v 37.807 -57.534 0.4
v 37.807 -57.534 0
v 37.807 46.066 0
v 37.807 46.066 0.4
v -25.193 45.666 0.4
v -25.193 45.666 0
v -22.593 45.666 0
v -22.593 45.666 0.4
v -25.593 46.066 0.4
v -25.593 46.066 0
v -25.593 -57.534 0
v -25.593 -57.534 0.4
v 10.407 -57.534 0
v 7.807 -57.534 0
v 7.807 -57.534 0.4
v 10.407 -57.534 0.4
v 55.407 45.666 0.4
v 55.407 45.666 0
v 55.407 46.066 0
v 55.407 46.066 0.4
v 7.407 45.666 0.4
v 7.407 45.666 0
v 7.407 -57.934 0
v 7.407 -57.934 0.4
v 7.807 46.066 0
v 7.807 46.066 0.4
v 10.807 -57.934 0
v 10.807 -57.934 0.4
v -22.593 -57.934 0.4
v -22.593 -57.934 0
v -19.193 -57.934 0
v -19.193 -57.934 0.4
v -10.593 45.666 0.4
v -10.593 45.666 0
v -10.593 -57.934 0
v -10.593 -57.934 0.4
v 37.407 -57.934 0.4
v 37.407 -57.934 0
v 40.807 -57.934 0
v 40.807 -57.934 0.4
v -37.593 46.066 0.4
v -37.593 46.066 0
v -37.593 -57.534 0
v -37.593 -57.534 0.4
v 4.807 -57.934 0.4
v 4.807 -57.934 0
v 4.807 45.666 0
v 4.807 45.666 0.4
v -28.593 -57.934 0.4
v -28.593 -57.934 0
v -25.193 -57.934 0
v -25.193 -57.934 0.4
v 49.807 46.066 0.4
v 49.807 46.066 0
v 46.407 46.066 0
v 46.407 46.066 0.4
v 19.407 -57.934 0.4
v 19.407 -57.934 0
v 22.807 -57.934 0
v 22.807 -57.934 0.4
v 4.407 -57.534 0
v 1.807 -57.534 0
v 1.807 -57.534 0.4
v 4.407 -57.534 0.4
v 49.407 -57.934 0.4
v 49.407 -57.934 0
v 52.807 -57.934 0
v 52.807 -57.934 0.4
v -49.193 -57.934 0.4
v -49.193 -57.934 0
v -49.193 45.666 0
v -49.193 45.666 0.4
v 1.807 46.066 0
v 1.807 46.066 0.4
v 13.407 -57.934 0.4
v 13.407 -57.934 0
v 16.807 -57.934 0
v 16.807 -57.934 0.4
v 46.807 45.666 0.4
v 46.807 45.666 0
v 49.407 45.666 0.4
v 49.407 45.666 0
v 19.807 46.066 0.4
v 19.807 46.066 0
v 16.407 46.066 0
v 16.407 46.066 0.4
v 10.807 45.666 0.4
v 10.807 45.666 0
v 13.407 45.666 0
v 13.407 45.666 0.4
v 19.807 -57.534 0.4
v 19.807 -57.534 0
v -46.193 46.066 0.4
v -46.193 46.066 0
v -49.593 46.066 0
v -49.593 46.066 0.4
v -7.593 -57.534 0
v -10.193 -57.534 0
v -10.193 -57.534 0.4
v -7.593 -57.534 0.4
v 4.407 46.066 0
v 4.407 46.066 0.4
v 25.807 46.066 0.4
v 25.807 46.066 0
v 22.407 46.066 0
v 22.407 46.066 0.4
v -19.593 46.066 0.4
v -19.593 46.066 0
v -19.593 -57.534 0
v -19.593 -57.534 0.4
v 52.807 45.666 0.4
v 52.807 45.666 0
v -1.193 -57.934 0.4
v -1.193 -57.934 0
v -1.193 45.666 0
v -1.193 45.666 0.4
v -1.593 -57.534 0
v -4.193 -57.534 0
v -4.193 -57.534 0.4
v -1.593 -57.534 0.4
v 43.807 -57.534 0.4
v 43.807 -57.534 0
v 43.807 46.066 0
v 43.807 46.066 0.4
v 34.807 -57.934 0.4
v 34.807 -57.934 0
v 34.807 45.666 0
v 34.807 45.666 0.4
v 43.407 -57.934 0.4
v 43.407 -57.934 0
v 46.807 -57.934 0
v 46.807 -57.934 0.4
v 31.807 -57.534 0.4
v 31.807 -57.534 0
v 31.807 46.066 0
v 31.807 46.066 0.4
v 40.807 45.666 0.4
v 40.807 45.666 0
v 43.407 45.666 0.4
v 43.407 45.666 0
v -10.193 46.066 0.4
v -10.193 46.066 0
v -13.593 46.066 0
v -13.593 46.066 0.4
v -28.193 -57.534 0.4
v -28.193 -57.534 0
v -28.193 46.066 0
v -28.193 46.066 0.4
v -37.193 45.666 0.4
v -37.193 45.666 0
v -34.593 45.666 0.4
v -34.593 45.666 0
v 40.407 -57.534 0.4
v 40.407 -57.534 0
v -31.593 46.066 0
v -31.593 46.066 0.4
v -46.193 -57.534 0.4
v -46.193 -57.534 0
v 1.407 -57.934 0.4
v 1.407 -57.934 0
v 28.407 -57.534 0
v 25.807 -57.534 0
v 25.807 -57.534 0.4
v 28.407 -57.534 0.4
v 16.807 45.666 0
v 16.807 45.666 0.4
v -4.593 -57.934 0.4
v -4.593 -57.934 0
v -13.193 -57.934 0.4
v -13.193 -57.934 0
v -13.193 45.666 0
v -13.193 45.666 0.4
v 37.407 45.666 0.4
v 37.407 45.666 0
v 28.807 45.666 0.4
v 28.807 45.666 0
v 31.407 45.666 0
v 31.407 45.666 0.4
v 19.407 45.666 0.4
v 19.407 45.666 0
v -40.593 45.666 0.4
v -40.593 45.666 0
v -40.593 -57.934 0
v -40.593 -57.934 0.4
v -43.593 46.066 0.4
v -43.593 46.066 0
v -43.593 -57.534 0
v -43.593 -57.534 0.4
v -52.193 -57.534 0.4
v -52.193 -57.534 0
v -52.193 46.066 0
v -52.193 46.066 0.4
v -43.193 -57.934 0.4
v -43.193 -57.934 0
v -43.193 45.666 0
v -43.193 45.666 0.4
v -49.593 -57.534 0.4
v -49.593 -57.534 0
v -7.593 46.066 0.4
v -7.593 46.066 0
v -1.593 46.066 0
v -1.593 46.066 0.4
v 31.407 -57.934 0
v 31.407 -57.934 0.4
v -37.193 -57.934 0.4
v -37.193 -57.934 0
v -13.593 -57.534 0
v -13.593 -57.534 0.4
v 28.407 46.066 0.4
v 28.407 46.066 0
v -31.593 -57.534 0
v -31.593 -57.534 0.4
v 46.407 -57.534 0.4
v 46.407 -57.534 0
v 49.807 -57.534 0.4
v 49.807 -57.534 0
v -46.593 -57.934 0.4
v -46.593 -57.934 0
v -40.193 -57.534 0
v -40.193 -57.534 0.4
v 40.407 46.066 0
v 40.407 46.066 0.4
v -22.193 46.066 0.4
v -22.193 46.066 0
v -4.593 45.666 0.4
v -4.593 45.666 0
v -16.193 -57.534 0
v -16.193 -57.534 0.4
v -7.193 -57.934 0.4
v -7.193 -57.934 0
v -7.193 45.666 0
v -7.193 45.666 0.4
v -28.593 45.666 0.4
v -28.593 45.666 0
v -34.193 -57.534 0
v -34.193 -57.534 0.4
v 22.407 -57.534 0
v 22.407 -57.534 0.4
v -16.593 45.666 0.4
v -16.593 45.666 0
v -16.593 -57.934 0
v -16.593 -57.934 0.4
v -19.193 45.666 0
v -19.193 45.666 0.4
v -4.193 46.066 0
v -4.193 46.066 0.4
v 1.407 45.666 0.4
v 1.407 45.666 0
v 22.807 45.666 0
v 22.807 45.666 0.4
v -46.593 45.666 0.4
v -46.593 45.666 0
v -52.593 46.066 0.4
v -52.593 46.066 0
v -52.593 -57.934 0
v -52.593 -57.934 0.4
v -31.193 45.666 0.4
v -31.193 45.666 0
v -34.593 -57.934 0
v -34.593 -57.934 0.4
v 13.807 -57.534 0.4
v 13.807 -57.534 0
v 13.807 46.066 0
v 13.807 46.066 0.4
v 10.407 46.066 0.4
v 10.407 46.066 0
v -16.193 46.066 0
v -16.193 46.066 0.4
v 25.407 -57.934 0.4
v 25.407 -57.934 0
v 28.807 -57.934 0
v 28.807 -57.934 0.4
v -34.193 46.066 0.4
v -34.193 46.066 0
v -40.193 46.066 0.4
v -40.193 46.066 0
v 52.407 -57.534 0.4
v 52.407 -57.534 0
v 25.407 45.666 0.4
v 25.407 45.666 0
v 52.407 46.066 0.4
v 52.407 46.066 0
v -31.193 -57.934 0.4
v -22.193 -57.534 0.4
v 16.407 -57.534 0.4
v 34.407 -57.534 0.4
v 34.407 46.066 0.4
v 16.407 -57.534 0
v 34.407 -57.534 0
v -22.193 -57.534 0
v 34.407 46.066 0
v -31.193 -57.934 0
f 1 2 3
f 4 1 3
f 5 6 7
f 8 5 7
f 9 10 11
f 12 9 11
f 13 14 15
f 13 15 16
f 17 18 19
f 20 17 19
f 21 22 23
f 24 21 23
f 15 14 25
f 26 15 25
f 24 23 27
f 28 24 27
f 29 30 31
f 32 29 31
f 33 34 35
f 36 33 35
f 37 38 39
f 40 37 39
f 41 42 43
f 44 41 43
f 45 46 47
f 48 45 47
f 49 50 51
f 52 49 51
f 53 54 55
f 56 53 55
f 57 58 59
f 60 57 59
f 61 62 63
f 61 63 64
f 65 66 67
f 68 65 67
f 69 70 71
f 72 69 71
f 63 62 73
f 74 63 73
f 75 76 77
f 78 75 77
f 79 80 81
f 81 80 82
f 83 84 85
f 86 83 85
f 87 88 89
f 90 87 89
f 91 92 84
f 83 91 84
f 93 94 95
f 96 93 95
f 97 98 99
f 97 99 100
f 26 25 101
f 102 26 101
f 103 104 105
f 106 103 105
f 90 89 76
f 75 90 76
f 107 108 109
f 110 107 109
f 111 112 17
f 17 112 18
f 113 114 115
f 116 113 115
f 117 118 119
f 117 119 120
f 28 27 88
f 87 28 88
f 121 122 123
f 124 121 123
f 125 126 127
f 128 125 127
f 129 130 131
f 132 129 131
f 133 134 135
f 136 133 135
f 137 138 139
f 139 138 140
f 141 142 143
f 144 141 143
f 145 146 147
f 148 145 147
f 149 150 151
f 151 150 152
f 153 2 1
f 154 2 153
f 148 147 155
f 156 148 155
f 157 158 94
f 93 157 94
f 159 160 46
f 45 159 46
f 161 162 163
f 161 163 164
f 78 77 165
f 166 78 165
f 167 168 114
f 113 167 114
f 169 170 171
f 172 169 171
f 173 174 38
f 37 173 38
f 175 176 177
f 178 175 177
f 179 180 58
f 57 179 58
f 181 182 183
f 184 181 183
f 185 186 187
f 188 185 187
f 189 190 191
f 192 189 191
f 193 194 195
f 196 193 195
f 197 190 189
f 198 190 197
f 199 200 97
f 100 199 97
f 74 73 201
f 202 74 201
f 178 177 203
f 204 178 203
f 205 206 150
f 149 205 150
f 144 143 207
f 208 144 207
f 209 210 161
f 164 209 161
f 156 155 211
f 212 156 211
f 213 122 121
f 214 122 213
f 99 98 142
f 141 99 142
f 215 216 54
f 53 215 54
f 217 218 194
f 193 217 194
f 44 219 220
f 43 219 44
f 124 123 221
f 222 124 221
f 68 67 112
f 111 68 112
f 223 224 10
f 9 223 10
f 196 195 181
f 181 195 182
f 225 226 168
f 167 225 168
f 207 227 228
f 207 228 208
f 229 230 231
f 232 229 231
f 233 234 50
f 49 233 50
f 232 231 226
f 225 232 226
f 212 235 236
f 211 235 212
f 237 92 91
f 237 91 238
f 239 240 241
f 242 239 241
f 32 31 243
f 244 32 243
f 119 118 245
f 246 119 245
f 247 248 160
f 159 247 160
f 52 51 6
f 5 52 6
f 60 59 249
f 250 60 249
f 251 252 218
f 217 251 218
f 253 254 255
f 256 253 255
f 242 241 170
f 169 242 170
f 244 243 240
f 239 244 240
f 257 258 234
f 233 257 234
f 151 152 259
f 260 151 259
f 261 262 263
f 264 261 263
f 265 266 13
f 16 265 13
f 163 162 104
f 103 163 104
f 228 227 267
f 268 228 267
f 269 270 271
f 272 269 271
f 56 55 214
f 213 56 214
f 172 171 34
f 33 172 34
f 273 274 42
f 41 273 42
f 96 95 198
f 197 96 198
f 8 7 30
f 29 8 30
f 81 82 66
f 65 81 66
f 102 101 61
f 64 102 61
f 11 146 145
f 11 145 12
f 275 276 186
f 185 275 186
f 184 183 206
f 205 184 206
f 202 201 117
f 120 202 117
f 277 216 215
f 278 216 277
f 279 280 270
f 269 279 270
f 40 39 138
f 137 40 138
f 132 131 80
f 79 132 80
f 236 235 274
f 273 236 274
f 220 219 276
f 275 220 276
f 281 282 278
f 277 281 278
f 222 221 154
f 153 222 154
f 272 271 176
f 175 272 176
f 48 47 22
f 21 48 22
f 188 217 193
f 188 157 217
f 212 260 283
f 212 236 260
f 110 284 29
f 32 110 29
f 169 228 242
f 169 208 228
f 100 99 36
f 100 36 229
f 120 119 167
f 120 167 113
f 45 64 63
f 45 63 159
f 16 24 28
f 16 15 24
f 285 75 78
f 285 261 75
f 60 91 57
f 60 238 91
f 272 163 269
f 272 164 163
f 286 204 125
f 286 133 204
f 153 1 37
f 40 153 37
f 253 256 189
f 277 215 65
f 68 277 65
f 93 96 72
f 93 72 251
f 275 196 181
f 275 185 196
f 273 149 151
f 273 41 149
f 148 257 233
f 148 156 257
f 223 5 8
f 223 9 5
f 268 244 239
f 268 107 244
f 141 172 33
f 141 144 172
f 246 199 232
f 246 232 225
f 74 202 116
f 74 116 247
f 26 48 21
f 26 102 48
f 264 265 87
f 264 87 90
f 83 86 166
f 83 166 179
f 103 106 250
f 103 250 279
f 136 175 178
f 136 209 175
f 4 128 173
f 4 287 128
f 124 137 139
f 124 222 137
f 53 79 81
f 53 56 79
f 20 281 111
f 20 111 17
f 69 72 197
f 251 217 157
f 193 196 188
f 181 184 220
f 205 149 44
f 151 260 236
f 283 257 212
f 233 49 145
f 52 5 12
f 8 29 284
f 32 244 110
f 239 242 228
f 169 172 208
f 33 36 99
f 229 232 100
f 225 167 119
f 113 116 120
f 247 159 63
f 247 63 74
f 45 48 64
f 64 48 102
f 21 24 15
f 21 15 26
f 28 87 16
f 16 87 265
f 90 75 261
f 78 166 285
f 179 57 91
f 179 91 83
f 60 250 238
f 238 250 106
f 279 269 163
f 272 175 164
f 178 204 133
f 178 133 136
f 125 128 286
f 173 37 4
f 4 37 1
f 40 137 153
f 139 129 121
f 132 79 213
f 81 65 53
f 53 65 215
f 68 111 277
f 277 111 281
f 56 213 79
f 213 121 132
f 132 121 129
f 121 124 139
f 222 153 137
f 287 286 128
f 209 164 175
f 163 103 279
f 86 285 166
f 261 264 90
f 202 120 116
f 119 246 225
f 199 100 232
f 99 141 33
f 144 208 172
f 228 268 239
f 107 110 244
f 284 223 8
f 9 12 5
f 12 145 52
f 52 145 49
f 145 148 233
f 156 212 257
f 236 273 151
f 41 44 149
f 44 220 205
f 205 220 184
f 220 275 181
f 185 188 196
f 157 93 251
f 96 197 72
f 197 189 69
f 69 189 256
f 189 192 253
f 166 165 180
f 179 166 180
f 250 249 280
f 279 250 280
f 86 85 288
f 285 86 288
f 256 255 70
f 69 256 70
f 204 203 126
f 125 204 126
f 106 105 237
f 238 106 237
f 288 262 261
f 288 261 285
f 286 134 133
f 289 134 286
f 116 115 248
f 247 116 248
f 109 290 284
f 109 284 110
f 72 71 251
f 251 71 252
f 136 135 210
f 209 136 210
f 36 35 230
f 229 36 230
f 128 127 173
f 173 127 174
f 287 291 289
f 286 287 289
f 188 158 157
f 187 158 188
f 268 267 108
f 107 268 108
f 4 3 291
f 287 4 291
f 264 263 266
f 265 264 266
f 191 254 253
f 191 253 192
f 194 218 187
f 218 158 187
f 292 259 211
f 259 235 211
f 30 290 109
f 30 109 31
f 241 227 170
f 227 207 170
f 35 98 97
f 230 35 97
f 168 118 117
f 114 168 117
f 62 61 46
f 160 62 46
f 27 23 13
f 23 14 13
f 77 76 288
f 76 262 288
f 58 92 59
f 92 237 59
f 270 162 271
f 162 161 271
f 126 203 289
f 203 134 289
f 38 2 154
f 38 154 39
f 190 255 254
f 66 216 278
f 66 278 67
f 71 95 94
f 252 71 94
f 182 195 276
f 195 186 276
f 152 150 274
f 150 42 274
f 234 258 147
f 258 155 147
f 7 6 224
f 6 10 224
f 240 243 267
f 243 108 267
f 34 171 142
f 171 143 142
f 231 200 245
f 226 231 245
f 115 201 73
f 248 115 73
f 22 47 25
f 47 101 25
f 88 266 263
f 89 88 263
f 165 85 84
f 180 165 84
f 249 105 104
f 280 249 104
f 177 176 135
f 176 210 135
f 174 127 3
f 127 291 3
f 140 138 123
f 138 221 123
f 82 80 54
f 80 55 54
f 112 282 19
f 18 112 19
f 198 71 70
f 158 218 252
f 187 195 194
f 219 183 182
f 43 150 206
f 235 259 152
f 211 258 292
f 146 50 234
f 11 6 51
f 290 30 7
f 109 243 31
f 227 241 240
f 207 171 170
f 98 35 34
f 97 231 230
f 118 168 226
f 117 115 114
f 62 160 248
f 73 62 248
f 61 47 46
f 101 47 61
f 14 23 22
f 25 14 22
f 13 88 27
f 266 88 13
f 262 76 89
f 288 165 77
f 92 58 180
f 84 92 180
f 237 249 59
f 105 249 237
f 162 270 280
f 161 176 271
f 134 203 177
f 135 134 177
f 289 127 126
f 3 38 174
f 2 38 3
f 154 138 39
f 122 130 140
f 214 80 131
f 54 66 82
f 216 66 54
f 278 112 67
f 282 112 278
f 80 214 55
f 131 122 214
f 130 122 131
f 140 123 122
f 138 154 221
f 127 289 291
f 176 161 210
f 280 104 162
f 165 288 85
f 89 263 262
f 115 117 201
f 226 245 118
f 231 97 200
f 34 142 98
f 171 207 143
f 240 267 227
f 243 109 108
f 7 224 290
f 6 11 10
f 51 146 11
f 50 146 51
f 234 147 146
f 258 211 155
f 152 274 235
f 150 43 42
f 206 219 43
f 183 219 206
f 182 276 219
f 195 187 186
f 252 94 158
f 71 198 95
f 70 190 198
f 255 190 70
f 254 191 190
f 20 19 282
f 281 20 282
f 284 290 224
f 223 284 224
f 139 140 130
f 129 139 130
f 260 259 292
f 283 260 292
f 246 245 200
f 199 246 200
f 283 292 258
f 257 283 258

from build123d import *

# Parameters (mm, degrees)
F0_W     = 0.4
F0_H     = 103.6
F0_W_2   = 2.6
F0_H_2   = 0.4
F1_DEPTH = 0.4


with BuildPart() as f1:
    # F0 (on Top) → F1 (new body)
    with BuildSketch(Plane.XY):
        with Locations((-52.392799, -5.733955)):
            Rectangle(F0_W, F0_H)
        with Locations((54.107201, 45.866045)):
            Rectangle(F0_W_2, F0_H_2)
        with Locations((-52.392799, -57.733955)):
            Rectangle(F0_W, F0_H_2)
        with Locations((-50.892799, -57.733955)):
            Rectangle(F0_W_2, F0_H_2)
        Polygon((-49.592799, 45.666045), (-49.592799, -57.533955), (-49.592799, -57.933955), (-49.192799, -57.933955), (-49.192799, 45.666045), align=None)
        with Locations((-49.392799, 45.866045)):
            Rectangle(F0_W, F0_H_2)
        with Locations((-47.892799, 45.866045)):
            Rectangle(F0_W_2, F0_H_2)
        Polygon((-46.592799, 46.066045), (-46.592799, 45.666045), (-46.592799, -57.533955), (-46.192799, -57.533955), (-46.192799, 46.066045), align=None)
        with Locations((-46.392799, -57.733955)):
            Rectangle(F0_W, F0_H_2)
        with Locations((-44.892799, -57.733955)):
            Rectangle(F0_W_2, F0_H_2)
        Polygon((-43.592799, 45.666045), (-43.592799, -57.533955), (-43.592799, -57.933955), (-43.192799, -57.933955), (-43.192799, 45.666045), align=None)
        with Locations((-43.392799, 45.866045)):
            Rectangle(F0_W, F0_H_2)
        with Locations((-41.892799, 45.866045)):
            Rectangle(F0_W_2, F0_H_2)
        Polygon((-40.592799, 46.066045), (-40.592799, 45.666045), (-40.592799, -57.533955), (-40.192799, -57.533955), (-40.192799, 46.066045), align=None)
        with Locations((-40.392799, -57.733955)):
            Rectangle(F0_W, F0_H_2)
        with Locations((-38.892799, -57.733955)):
            Rectangle(F0_W_2, F0_H_2)
        Polygon((-37.592799, 45.666045), (-37.592799, -57.533955), (-37.592799, -57.933955), (-37.192799, -57.933955), (-37.192799, 45.666045), align=None)
        with Locations((-37.392799, 45.866045)):
            Rectangle(F0_W, F0_H_2)
        with Locations((-35.892799, 45.866045)):
            Rectangle(F0_W_2, F0_H_2)
        Polygon((-34.592799, 46.066045), (-34.592799, 45.666045), (-34.592799, -57.533955), (-34.192799, -57.533955), (-34.192799, 46.066045), align=None)
        with Locations((-34.392799, -57.733955)):
            Rectangle(F0_W, F0_H_2)
        with Locations((-32.892799, -57.733955)):
            Rectangle(F0_W_2, F0_H_2)
        Polygon((-31.592799, 45.666045), (-31.592799, -57.533955), (-31.592799, -57.933955), (-31.192799, -57.933955), (-31.192799, 45.666045), align=None)
        with Locations((-31.392799, 45.866045)):
            Rectangle(F0_W, F0_H_2)
        with Locations((-29.892799, 45.866045)):
            Rectangle(F0_W_2, F0_H_2)
        Polygon((-28.592799, 46.066045), (-28.592799, 45.666045), (-28.592799, -57.533955), (-28.192799, -57.533955), (-28.192799, 46.066045), align=None)
        with Locations((-28.392799, -57.733955)):
            Rectangle(F0_W, F0_H_2)
        with Locations((-26.892799, -57.733955)):
            Rectangle(F0_W_2, F0_H_2)
        Polygon((-25.592799, 45.666045), (-25.592799, -57.533955), (-25.592799, -57.933955), (-25.192799, -57.933955), (-25.192799, 45.666045), align=None)
        with Locations((-25.392799, 45.866045)):
            Rectangle(F0_W, F0_H_2)
        with Locations((-23.892799, 45.866045)):
            Rectangle(F0_W_2, F0_H_2)
        Polygon((-22.592799, 46.066045), (-22.592799, 45.666045), (-22.592799, -57.533955), (-22.192799, -57.533955), (-22.192799, 46.066045), align=None)
        with Locations((-22.392799, -57.733955)):
            Rectangle(F0_W, F0_H_2)
        with Locations((-20.892799, -57.733955)):
            Rectangle(F0_W_2, F0_H_2)
        Polygon((-19.592799, 45.666045), (-19.592799, -57.533955), (-19.592799, -57.933955), (-19.192799, -57.933955), (-19.192799, 45.666045), align=None)
        with Locations((-19.392799, 45.866045)):
            Rectangle(F0_W, F0_H_2)
        with Locations((-17.892799, 45.866045)):
            Rectangle(F0_W_2, F0_H_2)
        Polygon((-16.592799, 46.066045), (-16.592799, 45.666045), (-16.592799, -57.533955), (-16.192799, -57.533955), (-16.192799, 46.066045), align=None)
        with Locations((-16.392799, -57.733955)):
            Rectangle(F0_W, F0_H_2)
        with Locations((-14.892799, -57.733955)):
            Rectangle(F0_W_2, F0_H_2)
        Polygon((-13.592799, 45.666045), (-13.592799, -57.533955), (-13.592799, -57.933955), (-13.192799, -57.933955), (-13.192799, 45.666045), align=None)
        with Locations((-13.392799, 45.866045)):
            Rectangle(F0_W, F0_H_2)
        with Locations((-11.892799, 45.866045)):
            Rectangle(F0_W_2, F0_H_2)
        Polygon((-10.592799, 46.066045), (-10.592799, 45.666045), (-10.592799, -57.533955), (-10.192799, -57.533955), (-10.192799, 46.066045), align=None)
        with Locations((-10.392799, -57.733955)):
            Rectangle(F0_W, F0_H_2)
        with Locations((-8.892799, -57.733955)):
            Rectangle(F0_W_2, F0_H_2)
        Polygon((-7.592799, 45.666045), (-7.592799, -57.533955), (-7.592799, -57.933955), (-7.192799, -57.933955), (-7.192799, 45.666045), align=None)
        with Locations((-7.392799, 45.866045)):
            Rectangle(F0_W, F0_H_2)
        with Locations((-5.892799, 45.866045)):
            Rectangle(F0_W_2, F0_H_2)
        Polygon((-4.592799, 46.066045), (-4.592799, 45.666045), (-4.592799, -57.533955), (-4.192799, -57.533955), (-4.192799, 46.066045), align=None)
        with Locations((-4.392799, -57.733955)):
            Rectangle(F0_W, F0_H_2)
        with Locations((-2.892799, -57.733955)):
            Rectangle(F0_W_2, F0_H_2)
        Polygon((-1.592799, 45.666045), (-1.592799, -57.533955), (-1.592799, -57.933955), (-1.192799, -57.933955), (-1.192799, 45.666045), align=None)
        with Locations((-1.392799, 45.866045)):
            Rectangle(F0_W, F0_H_2)
        with Locations((0.107201, 45.866045)):
            Rectangle(F0_W_2, F0_H_2)
        Polygon((1.407201, 46.066045), (1.407201, 45.666045), (1.407201, -57.533955), (1.807201, -57.533955), (1.807201, 46.066045), align=None)
        with Locations((1.607201, -57.733955)):
            Rectangle(F0_W, F0_H_2)
        with Locations((3.107201, -57.733955)):
            Rectangle(F0_W_2, F0_H_2)
        Polygon((4.407201, 45.666045), (4.407201, -57.533955), (4.407201, -57.933955), (4.807201, -57.933955), (4.807201, 45.666045), align=None)
        with Locations((4.607201, 45.866045)):
            Rectangle(F0_W, F0_H_2)
        with Locations((6.107201, 45.866045)):
            Rectangle(F0_W_2, F0_H_2)
        Polygon((7.407201, 46.066045), (7.407201, 45.666045), (7.407201, -57.533955), (7.807201, -57.533955), (7.807201, 46.066045), align=None)
        with Locations((7.607201, -57.733955)):
            Rectangle(F0_W, F0_H_2)
        with Locations((9.107201, -57.733955)):
            Rectangle(F0_W_2, F0_H_2)
        Polygon((10.407201, 45.666045), (10.407201, -57.533955), (10.407201, -57.933955), (10.807201, -57.933955), (10.807201, 45.666045), align=None)
        with Locations((10.607201, 45.866045)):
            Rectangle(F0_W, F0_H_2)
        with Locations((12.107201, 45.866045)):
            Rectangle(F0_W_2, F0_H_2)
        Polygon((13.407201, 46.066045), (13.407201, 45.666045), (13.407201, -57.533955), (13.807201, -57.533955), (13.807201, 46.066045), align=None)
        with Locations((13.607201, -57.733955)):
            Rectangle(F0_W, F0_H_2)
        with Locations((15.107201, -57.733955)):
            Rectangle(F0_W_2, F0_H_2)
        Polygon((16.407201, 45.666045), (16.407201, -57.533955), (16.407201, -57.933955), (16.807201, -57.933955), (16.807201, 45.666045), align=None)
        with Locations((16.607201, 45.866045)):
            Rectangle(F0_W, F0_H_2)
        with Locations((18.107201, 45.866045)):
            Rectangle(F0_W_2, F0_H_2)
        Polygon((19.407201, 46.066045), (19.407201, 45.666045), (19.407201, -57.533955), (19.807201, -57.533955), (19.807201, 46.066045), align=None)
        with Locations((19.607201, -57.733955)):
            Rectangle(F0_W, F0_H_2)
        with Locations((21.107201, -57.733955)):
            Rectangle(F0_W_2, F0_H_2)
        Polygon((22.407201, 45.666045), (22.407201, -57.533955), (22.407201, -57.933955), (22.807201, -57.933955), (22.807201, 45.666045), align=None)
        with Locations((22.607201, 45.866045)):
            Rectangle(F0_W, F0_H_2)
        with Locations((24.107201, 45.866045)):
            Rectangle(F0_W_2, F0_H_2)
        Polygon((25.407201, 46.066045), (25.407201, 45.666045), (25.407201, -57.533955), (25.807201, -57.533955), (25.807201, 46.066045), align=None)
        with Locations((25.607201, -57.733955)):
            Rectangle(F0_W, F0_H_2)
        with Locations((27.107201, -57.733955)):
            Rectangle(F0_W_2, F0_H_2)
        Polygon((28.407201, 45.666045), (28.407201, -57.533955), (28.407201, -57.933955), (28.807201, -57.933955), (28.807201, 45.666045), align=None)
        with Locations((28.607201, 45.866045)):
            Rectangle(F0_W, F0_H_2)
        with Locations((30.107201, 45.866045)):
            Rectangle(F0_W_2, F0_H_2)
        Polygon((31.407201, 46.066045), (31.407201, 45.666045), (31.407201, -57.533955), (31.807201, -57.533955), (31.807201, 46.066045), align=None)
        with Locations((31.607201, -57.733955)):
            Rectangle(F0_W, F0_H_2)
        with Locations((33.107201, -57.733955)):
            Rectangle(F0_W_2, F0_H_2)
        Polygon((34.407201, 45.666045), (34.407201, -57.533955), (34.407201, -57.933955), (34.807201, -57.933955), (34.807201, 45.666045), align=None)
        with Locations((34.607201, 45.866045)):
            Rectangle(F0_W, F0_H_2)
        with Locations((36.107201, 45.866045)):
            Rectangle(F0_W_2, F0_H_2)
        Polygon((37.407201, 46.066045), (37.407201, 45.666045), (37.407201, -57.533955), (37.807201, -57.533955), (37.807201, 46.066045), align=None)
        with Locations((37.607201, -57.733955)):
            Rectangle(F0_W, F0_H_2)
        with Locations((39.107201, -57.733955)):
            Rectangle(F0_W_2, F0_H_2)
        Polygon((40.407201, 45.666045), (40.407201, -57.533955), (40.407201, -57.933955), (40.807201, -57.933955), (40.807201, 45.666045), align=None)
        with Locations((40.607201, 45.866045)):
            Rectangle(F0_W, F0_H_2)
        with Locations((42.107201, 45.866045)):
            Rectangle(F0_W_2, F0_H_2)
        Polygon((43.407201, 46.066045), (43.407201, 45.666045), (43.407201, -57.533955), (43.807201, -57.533955), (43.807201, 46.066045), align=None)
        with Locations((43.607201, -57.733955)):
            Rectangle(F0_W, F0_H_2)
        with Locations((45.107201, -57.733955)):
            Rectangle(F0_W_2, F0_H_2)
        Polygon((46.407201, 45.666045), (46.407201, -57.533955), (46.407201, -57.933955), (46.807201, -57.933955), (46.807201, 45.666045), align=None)
        with Locations((46.607201, 45.866045)):
            Rectangle(F0_W, F0_H_2)
        with Locations((48.107201, 45.866045)):
            Rectangle(F0_W_2, F0_H_2)
        Polygon((49.407201, 46.066045), (49.407201, 45.666045), (49.407201, -57.533955), (49.807201, -57.533955), (49.807201, 46.066045), align=None)
        with Locations((49.607201, -57.733955)):
            Rectangle(F0_W, F0_H_2)
        with Locations((51.107201, -57.733955)):
            Rectangle(F0_W_2, F0_H_2)
        Polygon((52.407201, 45.666045), (52.407201, -57.533955), (52.407201, -57.933955), (52.807201, -57.933955), (52.807201, 45.666045), align=None)
        with Locations((52.607201, 45.866045)):
            Rectangle(F0_W, F0_H_2)
    extrude(amount=F1_DEPTH)


solid = f1.part
